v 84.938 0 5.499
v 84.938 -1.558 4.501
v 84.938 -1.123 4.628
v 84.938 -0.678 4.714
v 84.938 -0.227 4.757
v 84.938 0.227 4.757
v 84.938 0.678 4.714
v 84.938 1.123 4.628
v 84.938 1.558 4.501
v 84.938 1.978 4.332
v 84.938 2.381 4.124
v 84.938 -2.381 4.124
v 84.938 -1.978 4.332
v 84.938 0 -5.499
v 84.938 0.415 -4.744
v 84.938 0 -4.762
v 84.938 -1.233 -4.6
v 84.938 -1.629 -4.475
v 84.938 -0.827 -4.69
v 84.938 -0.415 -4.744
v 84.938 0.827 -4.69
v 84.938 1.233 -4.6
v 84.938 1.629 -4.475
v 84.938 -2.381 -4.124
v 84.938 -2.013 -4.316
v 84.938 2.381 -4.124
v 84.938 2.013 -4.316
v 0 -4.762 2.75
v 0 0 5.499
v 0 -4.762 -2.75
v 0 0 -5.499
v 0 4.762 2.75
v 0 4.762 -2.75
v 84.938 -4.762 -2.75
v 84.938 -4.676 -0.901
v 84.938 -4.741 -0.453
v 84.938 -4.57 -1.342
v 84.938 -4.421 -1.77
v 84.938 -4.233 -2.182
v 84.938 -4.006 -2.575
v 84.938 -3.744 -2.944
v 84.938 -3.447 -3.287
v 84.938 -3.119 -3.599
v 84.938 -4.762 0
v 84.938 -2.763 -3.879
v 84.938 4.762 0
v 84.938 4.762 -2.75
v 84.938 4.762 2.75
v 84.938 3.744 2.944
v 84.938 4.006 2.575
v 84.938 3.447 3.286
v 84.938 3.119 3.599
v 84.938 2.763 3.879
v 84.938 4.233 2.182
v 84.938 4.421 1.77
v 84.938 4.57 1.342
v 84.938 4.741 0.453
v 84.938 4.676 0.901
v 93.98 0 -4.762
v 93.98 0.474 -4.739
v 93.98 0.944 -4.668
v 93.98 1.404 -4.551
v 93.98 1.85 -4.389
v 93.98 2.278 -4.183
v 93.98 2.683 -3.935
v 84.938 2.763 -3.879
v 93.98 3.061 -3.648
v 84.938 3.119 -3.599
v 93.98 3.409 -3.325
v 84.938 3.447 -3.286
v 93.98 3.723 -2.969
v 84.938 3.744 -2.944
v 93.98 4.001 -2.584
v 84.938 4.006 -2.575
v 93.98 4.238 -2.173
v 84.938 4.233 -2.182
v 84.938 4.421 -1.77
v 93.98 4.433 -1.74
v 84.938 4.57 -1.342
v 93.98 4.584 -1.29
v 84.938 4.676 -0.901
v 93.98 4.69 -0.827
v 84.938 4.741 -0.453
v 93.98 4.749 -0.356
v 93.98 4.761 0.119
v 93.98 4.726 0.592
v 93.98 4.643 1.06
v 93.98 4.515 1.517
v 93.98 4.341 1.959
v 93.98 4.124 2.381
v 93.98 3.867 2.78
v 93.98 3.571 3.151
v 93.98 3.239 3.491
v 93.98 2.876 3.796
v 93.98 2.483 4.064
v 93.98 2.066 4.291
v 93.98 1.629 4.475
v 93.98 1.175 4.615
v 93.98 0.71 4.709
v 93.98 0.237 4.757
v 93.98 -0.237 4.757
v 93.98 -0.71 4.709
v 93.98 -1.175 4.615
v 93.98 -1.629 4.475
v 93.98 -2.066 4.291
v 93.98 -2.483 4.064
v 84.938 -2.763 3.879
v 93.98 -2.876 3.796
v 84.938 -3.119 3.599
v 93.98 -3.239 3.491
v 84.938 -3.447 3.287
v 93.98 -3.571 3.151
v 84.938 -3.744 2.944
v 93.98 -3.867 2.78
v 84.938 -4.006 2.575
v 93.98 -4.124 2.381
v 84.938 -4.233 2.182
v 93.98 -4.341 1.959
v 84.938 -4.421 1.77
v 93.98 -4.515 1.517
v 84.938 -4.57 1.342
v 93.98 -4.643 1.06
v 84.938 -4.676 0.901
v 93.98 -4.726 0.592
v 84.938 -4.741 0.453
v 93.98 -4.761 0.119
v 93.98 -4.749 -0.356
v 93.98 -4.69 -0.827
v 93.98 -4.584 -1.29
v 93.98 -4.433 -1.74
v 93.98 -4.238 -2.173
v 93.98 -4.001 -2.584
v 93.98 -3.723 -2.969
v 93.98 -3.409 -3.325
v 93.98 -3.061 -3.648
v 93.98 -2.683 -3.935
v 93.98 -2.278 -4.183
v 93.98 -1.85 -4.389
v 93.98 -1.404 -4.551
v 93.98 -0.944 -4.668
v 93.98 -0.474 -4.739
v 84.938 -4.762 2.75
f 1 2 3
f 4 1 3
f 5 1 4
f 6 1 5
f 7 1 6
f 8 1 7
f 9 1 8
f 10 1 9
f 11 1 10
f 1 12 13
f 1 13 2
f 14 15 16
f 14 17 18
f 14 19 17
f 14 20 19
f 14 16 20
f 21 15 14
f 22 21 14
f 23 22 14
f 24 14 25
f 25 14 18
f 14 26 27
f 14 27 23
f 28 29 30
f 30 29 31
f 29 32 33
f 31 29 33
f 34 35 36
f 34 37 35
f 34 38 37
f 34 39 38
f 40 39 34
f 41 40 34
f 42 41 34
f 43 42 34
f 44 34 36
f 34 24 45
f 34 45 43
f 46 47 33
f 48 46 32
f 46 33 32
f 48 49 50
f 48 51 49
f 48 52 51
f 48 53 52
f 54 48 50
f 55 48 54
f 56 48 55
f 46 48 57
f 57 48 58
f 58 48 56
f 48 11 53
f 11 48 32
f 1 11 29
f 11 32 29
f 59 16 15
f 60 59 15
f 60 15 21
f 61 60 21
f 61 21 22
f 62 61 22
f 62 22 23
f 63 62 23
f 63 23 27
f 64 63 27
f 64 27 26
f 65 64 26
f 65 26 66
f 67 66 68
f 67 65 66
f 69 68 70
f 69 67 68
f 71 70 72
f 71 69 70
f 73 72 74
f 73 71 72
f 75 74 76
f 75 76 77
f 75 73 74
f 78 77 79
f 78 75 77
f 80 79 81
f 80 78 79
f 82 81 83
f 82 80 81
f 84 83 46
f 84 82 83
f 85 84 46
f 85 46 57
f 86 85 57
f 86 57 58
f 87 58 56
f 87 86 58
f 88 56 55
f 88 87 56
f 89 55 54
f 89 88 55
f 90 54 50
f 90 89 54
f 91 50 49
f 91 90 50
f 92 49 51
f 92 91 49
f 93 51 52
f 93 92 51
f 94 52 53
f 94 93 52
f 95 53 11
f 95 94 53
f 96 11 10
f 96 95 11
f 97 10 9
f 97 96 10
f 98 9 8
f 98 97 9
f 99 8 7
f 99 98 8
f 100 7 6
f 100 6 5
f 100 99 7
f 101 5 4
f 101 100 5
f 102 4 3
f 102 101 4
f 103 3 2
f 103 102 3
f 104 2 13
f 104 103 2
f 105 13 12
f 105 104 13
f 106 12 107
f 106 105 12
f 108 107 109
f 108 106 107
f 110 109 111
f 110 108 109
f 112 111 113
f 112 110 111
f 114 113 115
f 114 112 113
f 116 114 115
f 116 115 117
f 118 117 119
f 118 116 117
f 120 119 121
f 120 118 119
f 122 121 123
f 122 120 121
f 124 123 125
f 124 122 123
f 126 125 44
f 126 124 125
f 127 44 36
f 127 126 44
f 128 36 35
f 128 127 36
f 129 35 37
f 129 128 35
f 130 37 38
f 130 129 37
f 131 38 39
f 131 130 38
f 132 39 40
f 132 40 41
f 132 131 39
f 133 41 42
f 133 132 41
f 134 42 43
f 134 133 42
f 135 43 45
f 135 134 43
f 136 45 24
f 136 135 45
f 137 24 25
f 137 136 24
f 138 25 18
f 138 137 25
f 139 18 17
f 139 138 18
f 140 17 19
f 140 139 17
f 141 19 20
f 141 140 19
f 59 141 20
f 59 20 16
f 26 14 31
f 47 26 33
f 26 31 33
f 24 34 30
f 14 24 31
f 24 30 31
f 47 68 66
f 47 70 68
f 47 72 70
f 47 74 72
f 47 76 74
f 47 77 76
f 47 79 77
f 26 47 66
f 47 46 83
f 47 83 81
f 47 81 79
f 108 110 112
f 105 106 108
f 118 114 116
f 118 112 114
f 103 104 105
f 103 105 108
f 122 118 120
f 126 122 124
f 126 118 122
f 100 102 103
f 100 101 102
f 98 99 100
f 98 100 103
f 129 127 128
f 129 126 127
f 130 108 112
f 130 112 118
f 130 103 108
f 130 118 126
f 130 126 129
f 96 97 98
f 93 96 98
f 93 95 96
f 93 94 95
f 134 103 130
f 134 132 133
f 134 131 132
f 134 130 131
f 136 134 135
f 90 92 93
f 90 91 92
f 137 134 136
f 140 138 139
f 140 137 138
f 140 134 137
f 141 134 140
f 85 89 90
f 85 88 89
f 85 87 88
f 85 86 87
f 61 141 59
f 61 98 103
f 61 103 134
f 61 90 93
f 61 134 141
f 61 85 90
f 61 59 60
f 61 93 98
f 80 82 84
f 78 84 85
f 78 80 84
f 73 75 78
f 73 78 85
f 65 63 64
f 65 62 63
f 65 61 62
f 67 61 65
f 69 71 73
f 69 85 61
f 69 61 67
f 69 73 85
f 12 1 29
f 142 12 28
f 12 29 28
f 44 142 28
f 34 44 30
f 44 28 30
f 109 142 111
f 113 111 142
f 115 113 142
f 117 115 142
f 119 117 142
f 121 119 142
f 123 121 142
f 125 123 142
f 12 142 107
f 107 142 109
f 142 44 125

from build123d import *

# Parameters (mm, degrees)
BOSS_EXTRUDE1_DEPTH = 93.98
SKETCH2_R           = 5.499261314
SKETCH2_R_2         = 4.7625
CUT_EXTRUDE1_DEPTH  = 9.0424


with BuildPart() as part:
    # Sketch1 → Boss-Extrude1 (new body)
    with BuildSketch(Plane(origin=(0, 0, 0), x_dir=(0, 0, -1), z_dir=(1, 0, 0))):
        Polygon((-5.499261314, 0), (-2.749630657, -4.7625), (2.749630657, -4.7625), (5.499261314, 0), (2.749630657, 4.7625), (-2.749630657, 4.7625), align=None)
    extrude(amount=BOSS_EXTRUDE1_DEPTH)

    # Sketch2 → Cut-Extrude1 (cut)
    with BuildSketch(Plane(origin=(93.98, 0, 0), x_dir=(0, 0, -1), z_dir=(1, 0, 0))):
        Circle(SKETCH2_R)
        Circle(SKETCH2_R_2, mode=Mode.SUBTRACT)
    extrude(amount=-CUT_EXTRUDE1_DEPTH, mode=Mode.SUBTRACT)


solid = part.part
